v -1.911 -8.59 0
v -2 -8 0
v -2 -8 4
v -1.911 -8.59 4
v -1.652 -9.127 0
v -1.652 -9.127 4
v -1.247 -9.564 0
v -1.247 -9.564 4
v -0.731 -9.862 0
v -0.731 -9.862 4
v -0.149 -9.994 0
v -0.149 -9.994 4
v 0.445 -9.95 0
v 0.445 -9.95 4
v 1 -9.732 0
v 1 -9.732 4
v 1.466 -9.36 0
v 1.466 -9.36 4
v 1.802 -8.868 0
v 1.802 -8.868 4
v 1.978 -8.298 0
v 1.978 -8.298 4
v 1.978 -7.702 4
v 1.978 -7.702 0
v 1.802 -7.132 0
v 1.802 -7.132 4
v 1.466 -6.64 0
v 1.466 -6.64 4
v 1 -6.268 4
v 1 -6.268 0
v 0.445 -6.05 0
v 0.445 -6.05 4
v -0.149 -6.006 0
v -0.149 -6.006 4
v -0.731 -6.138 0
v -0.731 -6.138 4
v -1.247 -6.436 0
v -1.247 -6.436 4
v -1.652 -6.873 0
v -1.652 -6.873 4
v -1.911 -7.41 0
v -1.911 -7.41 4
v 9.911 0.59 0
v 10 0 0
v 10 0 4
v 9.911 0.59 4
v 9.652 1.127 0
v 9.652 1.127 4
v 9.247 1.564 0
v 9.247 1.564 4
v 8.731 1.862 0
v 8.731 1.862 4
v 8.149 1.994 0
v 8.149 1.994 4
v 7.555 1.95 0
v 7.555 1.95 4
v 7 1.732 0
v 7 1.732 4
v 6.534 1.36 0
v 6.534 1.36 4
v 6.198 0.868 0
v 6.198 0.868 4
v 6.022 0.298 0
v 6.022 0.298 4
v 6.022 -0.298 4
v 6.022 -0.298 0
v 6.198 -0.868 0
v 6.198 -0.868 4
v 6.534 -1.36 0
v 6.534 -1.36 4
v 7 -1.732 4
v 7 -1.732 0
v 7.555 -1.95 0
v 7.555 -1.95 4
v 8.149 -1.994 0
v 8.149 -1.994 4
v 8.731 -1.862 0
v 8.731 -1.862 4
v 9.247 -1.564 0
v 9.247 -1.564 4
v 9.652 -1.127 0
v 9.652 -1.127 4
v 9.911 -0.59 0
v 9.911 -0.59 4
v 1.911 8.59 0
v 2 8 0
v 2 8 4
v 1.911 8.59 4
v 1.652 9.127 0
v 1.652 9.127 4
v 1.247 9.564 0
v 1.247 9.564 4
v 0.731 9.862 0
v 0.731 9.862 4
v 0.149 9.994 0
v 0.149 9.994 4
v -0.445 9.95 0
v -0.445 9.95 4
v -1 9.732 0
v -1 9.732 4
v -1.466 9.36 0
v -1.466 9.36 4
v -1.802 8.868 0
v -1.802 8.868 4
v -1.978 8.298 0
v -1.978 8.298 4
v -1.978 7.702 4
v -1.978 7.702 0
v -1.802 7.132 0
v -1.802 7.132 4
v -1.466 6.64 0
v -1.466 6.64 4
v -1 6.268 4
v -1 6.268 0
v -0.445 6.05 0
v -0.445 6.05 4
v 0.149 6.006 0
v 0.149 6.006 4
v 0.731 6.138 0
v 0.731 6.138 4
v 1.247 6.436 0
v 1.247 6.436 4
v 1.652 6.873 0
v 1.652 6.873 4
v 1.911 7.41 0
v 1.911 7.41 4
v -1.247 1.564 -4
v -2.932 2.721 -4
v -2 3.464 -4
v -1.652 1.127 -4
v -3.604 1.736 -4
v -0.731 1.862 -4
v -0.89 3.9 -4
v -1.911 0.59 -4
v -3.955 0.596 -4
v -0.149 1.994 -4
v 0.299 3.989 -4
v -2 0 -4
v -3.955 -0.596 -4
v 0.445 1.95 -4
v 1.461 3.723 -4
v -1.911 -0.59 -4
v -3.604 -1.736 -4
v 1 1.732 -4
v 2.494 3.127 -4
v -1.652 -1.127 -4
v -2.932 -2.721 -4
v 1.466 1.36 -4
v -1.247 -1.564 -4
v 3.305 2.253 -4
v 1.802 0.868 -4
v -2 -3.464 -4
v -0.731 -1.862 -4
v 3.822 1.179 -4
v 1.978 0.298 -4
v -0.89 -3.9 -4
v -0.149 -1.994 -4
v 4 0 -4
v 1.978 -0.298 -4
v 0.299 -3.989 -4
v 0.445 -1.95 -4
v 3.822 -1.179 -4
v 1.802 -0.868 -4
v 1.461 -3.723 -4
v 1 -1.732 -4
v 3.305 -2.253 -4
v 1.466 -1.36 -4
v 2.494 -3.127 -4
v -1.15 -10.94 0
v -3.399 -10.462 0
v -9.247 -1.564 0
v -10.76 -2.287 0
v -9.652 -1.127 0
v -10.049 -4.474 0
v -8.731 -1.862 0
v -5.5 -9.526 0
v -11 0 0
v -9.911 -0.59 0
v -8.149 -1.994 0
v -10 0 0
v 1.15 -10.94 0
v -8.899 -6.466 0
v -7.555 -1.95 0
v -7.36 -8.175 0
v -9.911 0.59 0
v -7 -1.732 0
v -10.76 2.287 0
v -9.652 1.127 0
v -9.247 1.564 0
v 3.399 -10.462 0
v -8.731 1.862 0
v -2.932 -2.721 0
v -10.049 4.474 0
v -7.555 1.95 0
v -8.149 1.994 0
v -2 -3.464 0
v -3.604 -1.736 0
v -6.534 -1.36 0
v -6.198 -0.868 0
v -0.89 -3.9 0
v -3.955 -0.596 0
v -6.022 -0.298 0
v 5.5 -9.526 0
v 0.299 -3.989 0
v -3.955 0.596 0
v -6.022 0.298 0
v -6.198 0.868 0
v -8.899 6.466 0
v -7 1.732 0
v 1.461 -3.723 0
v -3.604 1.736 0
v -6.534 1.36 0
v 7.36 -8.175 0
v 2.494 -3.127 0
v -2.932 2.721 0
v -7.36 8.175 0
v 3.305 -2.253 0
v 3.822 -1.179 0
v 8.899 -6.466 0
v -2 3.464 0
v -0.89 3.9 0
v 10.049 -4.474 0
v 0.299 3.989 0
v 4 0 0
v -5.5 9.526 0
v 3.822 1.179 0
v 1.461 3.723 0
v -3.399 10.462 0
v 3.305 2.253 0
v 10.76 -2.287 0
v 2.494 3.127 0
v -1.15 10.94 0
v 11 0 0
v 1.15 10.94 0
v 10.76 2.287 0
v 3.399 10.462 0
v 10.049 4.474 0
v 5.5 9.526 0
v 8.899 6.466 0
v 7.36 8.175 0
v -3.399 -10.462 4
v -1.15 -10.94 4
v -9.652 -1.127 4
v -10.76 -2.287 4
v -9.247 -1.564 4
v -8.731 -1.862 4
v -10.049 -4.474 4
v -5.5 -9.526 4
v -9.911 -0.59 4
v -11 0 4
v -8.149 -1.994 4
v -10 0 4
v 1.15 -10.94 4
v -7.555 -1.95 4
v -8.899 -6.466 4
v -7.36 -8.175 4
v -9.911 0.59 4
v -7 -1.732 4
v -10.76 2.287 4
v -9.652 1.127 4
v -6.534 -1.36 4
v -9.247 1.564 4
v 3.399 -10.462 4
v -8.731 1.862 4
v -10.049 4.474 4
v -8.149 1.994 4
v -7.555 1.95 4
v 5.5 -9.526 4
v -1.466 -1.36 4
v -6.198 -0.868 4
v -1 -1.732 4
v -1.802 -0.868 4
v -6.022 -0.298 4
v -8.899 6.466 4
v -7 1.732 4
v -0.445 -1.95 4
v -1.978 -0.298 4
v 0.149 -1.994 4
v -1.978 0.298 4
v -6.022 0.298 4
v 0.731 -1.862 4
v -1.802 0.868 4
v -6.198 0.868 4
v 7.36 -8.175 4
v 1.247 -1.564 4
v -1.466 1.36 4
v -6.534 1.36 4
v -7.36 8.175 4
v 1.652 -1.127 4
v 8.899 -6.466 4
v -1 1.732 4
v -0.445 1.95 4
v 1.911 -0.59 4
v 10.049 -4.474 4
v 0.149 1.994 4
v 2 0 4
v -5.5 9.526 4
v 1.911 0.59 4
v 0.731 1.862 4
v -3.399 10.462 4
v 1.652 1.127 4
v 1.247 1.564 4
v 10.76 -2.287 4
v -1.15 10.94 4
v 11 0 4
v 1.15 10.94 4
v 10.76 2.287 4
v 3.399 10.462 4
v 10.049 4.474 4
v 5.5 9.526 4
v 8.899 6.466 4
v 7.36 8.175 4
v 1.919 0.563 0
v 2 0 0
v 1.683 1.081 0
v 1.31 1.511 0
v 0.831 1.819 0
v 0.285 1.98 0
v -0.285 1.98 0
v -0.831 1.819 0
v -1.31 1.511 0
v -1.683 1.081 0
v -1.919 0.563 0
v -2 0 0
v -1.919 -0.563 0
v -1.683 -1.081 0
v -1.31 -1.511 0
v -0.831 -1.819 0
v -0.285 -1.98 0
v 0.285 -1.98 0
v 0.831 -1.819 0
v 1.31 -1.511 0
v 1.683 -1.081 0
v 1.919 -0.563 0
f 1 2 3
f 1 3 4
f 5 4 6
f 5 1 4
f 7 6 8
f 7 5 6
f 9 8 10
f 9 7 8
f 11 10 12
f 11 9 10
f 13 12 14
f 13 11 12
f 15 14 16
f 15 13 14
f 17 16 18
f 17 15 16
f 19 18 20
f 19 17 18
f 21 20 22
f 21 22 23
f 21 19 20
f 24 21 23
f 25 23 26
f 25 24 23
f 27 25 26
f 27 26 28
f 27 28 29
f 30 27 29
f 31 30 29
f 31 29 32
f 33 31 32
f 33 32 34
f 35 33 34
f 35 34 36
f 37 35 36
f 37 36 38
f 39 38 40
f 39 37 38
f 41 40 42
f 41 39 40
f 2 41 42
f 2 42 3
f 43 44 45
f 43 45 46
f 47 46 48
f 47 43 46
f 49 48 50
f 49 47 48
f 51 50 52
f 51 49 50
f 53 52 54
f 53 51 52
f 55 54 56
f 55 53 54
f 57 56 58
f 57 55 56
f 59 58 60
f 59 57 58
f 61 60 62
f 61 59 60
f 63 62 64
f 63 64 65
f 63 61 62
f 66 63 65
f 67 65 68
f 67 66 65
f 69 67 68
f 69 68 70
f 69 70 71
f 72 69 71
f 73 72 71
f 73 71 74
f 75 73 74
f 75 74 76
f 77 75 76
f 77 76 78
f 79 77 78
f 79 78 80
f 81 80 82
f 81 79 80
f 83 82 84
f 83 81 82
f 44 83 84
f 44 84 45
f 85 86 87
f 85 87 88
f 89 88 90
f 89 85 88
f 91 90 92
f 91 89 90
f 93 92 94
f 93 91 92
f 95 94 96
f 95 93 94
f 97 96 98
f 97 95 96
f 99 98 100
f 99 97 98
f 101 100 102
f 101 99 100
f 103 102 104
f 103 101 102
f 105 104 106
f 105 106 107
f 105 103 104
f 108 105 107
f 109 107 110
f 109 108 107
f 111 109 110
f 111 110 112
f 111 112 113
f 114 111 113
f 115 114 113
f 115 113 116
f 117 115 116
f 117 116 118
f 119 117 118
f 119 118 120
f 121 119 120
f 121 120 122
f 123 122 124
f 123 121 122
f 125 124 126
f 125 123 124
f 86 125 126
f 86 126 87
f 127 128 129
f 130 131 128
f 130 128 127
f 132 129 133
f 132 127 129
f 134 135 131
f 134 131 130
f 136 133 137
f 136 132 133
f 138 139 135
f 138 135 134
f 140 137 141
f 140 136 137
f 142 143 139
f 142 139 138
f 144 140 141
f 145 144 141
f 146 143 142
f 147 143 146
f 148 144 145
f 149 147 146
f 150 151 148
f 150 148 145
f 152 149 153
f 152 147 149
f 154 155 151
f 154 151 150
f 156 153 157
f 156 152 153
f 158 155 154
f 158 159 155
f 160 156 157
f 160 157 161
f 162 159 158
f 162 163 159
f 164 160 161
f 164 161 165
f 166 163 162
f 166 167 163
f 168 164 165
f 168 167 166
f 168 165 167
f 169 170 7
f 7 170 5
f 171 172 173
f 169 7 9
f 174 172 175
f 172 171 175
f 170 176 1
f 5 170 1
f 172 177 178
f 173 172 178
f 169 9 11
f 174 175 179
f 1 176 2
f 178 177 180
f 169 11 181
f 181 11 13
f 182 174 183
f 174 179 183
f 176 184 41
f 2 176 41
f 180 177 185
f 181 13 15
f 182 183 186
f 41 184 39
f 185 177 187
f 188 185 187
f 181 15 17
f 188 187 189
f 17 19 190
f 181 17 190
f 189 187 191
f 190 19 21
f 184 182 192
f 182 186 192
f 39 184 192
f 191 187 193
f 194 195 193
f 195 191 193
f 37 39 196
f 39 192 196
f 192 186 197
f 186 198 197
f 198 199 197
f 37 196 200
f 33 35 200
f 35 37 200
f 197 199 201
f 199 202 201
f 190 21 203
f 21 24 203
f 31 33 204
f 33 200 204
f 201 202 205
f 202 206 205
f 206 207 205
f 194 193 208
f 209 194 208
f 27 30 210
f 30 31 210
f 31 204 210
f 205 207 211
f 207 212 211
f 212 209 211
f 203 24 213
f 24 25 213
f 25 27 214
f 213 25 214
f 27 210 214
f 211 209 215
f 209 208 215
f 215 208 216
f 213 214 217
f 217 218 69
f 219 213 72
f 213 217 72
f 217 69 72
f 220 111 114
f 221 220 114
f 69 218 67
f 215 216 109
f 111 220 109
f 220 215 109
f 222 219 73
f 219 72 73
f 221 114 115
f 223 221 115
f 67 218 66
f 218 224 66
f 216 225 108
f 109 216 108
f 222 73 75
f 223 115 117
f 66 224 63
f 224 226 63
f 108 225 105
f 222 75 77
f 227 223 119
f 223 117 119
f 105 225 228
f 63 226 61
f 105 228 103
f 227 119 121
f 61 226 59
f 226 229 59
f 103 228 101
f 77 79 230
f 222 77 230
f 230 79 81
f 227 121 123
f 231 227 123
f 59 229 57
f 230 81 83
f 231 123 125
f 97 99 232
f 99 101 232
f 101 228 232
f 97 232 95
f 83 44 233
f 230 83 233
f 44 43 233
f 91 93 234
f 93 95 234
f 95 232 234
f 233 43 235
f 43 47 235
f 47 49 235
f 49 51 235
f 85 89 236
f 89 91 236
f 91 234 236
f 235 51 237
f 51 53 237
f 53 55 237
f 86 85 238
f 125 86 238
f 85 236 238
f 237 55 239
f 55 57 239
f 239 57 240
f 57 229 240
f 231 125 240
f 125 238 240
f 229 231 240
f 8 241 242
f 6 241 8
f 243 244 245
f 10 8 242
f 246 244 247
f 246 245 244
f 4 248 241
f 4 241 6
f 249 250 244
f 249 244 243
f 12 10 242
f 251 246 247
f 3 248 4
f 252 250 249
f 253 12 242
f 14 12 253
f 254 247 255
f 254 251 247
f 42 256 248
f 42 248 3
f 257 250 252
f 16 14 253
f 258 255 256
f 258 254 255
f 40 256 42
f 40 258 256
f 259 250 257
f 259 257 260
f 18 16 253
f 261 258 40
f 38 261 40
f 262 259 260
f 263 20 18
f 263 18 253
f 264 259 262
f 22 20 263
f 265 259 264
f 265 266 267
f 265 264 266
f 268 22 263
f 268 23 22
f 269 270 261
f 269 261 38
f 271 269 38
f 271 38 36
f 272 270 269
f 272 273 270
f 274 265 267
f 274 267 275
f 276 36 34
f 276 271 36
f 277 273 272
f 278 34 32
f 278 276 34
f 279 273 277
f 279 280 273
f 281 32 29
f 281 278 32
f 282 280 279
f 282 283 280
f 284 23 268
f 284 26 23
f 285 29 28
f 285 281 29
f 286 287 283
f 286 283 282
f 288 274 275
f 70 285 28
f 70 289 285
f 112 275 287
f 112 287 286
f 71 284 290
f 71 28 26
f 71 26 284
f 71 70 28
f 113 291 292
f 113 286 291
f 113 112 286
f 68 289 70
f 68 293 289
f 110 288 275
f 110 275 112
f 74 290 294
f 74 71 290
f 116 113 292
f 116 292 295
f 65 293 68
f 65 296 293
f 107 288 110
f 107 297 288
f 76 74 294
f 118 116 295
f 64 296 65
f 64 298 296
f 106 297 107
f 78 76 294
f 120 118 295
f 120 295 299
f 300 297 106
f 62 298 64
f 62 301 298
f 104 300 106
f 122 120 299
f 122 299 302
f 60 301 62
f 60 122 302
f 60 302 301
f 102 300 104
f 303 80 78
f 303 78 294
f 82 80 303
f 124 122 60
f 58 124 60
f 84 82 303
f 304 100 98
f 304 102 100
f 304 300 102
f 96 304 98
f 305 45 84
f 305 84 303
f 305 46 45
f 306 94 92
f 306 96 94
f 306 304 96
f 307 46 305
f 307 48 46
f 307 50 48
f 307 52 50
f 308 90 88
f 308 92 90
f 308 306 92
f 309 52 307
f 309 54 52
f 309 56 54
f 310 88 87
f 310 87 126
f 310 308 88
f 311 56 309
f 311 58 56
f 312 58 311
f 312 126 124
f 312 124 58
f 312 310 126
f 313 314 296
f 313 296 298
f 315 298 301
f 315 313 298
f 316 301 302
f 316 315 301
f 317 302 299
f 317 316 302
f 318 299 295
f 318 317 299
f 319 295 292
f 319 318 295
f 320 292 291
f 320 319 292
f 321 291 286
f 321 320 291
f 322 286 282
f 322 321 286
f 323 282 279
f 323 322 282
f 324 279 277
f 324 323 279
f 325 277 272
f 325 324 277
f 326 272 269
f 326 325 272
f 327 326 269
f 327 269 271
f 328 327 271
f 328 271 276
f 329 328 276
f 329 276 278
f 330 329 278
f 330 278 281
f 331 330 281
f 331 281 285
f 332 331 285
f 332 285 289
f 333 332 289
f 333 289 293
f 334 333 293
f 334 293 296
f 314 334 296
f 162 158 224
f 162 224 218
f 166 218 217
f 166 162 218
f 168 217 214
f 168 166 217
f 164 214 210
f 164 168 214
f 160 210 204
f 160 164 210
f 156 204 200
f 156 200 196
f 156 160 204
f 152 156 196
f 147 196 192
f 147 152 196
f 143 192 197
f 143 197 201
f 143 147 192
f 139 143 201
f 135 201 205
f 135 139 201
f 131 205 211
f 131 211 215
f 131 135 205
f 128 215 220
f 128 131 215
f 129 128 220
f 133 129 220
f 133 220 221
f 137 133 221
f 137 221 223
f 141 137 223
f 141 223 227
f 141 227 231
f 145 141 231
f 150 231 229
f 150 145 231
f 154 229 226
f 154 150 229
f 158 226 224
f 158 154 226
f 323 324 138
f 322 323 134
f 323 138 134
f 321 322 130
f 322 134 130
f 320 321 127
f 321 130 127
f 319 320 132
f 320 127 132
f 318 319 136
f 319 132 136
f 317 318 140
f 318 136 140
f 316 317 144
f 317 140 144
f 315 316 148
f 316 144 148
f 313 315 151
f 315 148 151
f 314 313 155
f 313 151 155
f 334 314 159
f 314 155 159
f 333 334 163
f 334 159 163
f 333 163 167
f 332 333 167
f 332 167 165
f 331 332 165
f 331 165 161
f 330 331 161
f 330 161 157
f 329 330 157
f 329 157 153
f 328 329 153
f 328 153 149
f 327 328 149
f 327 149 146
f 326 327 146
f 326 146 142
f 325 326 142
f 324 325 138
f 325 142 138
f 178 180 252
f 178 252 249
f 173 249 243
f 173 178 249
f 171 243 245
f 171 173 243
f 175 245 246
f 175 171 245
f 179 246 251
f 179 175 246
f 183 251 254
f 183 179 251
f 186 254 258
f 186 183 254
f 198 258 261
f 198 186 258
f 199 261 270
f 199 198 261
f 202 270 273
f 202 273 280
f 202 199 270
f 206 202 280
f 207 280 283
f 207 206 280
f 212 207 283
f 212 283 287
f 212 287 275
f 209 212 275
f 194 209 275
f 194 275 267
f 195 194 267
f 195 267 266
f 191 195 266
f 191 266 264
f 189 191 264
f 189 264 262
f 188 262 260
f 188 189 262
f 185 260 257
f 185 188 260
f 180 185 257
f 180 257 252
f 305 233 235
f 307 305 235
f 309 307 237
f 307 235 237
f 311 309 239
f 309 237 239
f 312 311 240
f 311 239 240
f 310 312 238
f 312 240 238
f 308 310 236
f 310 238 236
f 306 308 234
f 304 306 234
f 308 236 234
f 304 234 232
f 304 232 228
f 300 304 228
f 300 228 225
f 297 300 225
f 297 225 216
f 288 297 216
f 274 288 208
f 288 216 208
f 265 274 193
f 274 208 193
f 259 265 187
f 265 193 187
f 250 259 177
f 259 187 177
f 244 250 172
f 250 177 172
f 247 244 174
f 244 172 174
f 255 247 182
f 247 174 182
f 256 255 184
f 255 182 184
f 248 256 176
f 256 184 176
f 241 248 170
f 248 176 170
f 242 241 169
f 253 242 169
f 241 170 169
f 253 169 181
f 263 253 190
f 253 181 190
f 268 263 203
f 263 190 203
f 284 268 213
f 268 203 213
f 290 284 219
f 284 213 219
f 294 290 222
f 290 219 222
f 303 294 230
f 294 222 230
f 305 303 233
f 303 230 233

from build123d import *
from build123d.topology import SkipClean

# Parameters (mm, degrees)
IZIM1_R                     = 11
IZIM1_R_2                   = 2
Y_KSEKLIK_EKSTR_ZYON1_DEPTH = 4
Y_KSEKLIK_EKSTR_ZYON2_START = 4
IZIM2_R                     = 4
IZIM2_R_2                   = 2
Y_KSEKLIK_EKSTR_ZYON2_DEPTH = 4


with BuildPart() as part:
    # Çizim1 → Yükseklik-Ekstrüzyon1 (new body)
    with BuildSketch(Plane.XY):
        Circle(IZIM1_R)
        Circle(IZIM1_R_2, mode=Mode.SUBTRACT)
        with Locations((8, 0)):
            Circle(IZIM1_R_2, mode=Mode.SUBTRACT)
        with Locations((0, 8)):
            Circle(IZIM1_R_2, mode=Mode.SUBTRACT)
        with Locations(Location((-8, 0, 0), (0, 0, 180))):
            Circle(IZIM1_R_2, mode=Mode.SUBTRACT)
        with Locations(Location((0, -8, 0), (0, 0, 180))):
            Circle(IZIM1_R_2, mode=Mode.SUBTRACT)
    extrude(amount=Y_KSEKLIK_EKSTR_ZYON1_DEPTH)

    # Çizim2 → Yükseklik-Ekstrüzyon2 (add)
    with SkipClean():  # the faces are left unmerged after this step: merging them gives an invalid solid
        with BuildSketch(Plane(origin=(0, 0, 0), x_dir=(-1, 0, 0), z_dir=(0, 0, -1)).offset(Y_KSEKLIK_EKSTR_ZYON2_START)):
            with Locations(Location((0, 0, 0), (0, 0, 180))):
                Circle(IZIM2_R)
            Circle(IZIM2_R_2, mode=Mode.SUBTRACT)
        extrude(amount=-Y_KSEKLIK_EKSTR_ZYON2_DEPTH)


solid = part.part
